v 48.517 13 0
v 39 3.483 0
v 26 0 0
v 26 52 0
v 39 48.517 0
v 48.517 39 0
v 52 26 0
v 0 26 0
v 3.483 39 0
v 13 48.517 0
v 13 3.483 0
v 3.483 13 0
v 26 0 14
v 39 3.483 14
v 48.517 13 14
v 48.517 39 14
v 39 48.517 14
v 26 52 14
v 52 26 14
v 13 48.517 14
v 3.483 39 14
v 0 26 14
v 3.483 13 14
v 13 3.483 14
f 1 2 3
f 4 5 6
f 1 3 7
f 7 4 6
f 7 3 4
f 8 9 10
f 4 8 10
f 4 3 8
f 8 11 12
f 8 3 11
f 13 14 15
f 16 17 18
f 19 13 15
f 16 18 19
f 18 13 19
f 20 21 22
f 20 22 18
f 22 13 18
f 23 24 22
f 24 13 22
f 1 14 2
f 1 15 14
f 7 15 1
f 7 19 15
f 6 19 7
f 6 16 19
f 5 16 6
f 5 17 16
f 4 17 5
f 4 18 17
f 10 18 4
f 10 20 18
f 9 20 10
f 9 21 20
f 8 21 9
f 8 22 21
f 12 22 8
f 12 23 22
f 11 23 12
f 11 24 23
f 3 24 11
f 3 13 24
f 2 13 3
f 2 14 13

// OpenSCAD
$fn = 32;

// ----------------------------------------------------------------------
// Flat adaptor: keyed, 14 mm thick
// ----------------------------------------------------------------------

// --- parameters (mm) ---
profile_height = 14;      // extrusion height
profile_points = 12;      // points of the closed outline

profile = [[0, 26], [3.483, 13], [13, 3.483], [26, 0], [39, 3.483], [48.517, 13], [52, 26], [48.517, 39], [39, 48.517], [26, 52], [13, 48.517], [3.483, 39]];  // single closed polygon, 12 points, counter clockwise

// --- the one profile operation ---
linear_extrude(height = profile_height) polygon(points = profile);
